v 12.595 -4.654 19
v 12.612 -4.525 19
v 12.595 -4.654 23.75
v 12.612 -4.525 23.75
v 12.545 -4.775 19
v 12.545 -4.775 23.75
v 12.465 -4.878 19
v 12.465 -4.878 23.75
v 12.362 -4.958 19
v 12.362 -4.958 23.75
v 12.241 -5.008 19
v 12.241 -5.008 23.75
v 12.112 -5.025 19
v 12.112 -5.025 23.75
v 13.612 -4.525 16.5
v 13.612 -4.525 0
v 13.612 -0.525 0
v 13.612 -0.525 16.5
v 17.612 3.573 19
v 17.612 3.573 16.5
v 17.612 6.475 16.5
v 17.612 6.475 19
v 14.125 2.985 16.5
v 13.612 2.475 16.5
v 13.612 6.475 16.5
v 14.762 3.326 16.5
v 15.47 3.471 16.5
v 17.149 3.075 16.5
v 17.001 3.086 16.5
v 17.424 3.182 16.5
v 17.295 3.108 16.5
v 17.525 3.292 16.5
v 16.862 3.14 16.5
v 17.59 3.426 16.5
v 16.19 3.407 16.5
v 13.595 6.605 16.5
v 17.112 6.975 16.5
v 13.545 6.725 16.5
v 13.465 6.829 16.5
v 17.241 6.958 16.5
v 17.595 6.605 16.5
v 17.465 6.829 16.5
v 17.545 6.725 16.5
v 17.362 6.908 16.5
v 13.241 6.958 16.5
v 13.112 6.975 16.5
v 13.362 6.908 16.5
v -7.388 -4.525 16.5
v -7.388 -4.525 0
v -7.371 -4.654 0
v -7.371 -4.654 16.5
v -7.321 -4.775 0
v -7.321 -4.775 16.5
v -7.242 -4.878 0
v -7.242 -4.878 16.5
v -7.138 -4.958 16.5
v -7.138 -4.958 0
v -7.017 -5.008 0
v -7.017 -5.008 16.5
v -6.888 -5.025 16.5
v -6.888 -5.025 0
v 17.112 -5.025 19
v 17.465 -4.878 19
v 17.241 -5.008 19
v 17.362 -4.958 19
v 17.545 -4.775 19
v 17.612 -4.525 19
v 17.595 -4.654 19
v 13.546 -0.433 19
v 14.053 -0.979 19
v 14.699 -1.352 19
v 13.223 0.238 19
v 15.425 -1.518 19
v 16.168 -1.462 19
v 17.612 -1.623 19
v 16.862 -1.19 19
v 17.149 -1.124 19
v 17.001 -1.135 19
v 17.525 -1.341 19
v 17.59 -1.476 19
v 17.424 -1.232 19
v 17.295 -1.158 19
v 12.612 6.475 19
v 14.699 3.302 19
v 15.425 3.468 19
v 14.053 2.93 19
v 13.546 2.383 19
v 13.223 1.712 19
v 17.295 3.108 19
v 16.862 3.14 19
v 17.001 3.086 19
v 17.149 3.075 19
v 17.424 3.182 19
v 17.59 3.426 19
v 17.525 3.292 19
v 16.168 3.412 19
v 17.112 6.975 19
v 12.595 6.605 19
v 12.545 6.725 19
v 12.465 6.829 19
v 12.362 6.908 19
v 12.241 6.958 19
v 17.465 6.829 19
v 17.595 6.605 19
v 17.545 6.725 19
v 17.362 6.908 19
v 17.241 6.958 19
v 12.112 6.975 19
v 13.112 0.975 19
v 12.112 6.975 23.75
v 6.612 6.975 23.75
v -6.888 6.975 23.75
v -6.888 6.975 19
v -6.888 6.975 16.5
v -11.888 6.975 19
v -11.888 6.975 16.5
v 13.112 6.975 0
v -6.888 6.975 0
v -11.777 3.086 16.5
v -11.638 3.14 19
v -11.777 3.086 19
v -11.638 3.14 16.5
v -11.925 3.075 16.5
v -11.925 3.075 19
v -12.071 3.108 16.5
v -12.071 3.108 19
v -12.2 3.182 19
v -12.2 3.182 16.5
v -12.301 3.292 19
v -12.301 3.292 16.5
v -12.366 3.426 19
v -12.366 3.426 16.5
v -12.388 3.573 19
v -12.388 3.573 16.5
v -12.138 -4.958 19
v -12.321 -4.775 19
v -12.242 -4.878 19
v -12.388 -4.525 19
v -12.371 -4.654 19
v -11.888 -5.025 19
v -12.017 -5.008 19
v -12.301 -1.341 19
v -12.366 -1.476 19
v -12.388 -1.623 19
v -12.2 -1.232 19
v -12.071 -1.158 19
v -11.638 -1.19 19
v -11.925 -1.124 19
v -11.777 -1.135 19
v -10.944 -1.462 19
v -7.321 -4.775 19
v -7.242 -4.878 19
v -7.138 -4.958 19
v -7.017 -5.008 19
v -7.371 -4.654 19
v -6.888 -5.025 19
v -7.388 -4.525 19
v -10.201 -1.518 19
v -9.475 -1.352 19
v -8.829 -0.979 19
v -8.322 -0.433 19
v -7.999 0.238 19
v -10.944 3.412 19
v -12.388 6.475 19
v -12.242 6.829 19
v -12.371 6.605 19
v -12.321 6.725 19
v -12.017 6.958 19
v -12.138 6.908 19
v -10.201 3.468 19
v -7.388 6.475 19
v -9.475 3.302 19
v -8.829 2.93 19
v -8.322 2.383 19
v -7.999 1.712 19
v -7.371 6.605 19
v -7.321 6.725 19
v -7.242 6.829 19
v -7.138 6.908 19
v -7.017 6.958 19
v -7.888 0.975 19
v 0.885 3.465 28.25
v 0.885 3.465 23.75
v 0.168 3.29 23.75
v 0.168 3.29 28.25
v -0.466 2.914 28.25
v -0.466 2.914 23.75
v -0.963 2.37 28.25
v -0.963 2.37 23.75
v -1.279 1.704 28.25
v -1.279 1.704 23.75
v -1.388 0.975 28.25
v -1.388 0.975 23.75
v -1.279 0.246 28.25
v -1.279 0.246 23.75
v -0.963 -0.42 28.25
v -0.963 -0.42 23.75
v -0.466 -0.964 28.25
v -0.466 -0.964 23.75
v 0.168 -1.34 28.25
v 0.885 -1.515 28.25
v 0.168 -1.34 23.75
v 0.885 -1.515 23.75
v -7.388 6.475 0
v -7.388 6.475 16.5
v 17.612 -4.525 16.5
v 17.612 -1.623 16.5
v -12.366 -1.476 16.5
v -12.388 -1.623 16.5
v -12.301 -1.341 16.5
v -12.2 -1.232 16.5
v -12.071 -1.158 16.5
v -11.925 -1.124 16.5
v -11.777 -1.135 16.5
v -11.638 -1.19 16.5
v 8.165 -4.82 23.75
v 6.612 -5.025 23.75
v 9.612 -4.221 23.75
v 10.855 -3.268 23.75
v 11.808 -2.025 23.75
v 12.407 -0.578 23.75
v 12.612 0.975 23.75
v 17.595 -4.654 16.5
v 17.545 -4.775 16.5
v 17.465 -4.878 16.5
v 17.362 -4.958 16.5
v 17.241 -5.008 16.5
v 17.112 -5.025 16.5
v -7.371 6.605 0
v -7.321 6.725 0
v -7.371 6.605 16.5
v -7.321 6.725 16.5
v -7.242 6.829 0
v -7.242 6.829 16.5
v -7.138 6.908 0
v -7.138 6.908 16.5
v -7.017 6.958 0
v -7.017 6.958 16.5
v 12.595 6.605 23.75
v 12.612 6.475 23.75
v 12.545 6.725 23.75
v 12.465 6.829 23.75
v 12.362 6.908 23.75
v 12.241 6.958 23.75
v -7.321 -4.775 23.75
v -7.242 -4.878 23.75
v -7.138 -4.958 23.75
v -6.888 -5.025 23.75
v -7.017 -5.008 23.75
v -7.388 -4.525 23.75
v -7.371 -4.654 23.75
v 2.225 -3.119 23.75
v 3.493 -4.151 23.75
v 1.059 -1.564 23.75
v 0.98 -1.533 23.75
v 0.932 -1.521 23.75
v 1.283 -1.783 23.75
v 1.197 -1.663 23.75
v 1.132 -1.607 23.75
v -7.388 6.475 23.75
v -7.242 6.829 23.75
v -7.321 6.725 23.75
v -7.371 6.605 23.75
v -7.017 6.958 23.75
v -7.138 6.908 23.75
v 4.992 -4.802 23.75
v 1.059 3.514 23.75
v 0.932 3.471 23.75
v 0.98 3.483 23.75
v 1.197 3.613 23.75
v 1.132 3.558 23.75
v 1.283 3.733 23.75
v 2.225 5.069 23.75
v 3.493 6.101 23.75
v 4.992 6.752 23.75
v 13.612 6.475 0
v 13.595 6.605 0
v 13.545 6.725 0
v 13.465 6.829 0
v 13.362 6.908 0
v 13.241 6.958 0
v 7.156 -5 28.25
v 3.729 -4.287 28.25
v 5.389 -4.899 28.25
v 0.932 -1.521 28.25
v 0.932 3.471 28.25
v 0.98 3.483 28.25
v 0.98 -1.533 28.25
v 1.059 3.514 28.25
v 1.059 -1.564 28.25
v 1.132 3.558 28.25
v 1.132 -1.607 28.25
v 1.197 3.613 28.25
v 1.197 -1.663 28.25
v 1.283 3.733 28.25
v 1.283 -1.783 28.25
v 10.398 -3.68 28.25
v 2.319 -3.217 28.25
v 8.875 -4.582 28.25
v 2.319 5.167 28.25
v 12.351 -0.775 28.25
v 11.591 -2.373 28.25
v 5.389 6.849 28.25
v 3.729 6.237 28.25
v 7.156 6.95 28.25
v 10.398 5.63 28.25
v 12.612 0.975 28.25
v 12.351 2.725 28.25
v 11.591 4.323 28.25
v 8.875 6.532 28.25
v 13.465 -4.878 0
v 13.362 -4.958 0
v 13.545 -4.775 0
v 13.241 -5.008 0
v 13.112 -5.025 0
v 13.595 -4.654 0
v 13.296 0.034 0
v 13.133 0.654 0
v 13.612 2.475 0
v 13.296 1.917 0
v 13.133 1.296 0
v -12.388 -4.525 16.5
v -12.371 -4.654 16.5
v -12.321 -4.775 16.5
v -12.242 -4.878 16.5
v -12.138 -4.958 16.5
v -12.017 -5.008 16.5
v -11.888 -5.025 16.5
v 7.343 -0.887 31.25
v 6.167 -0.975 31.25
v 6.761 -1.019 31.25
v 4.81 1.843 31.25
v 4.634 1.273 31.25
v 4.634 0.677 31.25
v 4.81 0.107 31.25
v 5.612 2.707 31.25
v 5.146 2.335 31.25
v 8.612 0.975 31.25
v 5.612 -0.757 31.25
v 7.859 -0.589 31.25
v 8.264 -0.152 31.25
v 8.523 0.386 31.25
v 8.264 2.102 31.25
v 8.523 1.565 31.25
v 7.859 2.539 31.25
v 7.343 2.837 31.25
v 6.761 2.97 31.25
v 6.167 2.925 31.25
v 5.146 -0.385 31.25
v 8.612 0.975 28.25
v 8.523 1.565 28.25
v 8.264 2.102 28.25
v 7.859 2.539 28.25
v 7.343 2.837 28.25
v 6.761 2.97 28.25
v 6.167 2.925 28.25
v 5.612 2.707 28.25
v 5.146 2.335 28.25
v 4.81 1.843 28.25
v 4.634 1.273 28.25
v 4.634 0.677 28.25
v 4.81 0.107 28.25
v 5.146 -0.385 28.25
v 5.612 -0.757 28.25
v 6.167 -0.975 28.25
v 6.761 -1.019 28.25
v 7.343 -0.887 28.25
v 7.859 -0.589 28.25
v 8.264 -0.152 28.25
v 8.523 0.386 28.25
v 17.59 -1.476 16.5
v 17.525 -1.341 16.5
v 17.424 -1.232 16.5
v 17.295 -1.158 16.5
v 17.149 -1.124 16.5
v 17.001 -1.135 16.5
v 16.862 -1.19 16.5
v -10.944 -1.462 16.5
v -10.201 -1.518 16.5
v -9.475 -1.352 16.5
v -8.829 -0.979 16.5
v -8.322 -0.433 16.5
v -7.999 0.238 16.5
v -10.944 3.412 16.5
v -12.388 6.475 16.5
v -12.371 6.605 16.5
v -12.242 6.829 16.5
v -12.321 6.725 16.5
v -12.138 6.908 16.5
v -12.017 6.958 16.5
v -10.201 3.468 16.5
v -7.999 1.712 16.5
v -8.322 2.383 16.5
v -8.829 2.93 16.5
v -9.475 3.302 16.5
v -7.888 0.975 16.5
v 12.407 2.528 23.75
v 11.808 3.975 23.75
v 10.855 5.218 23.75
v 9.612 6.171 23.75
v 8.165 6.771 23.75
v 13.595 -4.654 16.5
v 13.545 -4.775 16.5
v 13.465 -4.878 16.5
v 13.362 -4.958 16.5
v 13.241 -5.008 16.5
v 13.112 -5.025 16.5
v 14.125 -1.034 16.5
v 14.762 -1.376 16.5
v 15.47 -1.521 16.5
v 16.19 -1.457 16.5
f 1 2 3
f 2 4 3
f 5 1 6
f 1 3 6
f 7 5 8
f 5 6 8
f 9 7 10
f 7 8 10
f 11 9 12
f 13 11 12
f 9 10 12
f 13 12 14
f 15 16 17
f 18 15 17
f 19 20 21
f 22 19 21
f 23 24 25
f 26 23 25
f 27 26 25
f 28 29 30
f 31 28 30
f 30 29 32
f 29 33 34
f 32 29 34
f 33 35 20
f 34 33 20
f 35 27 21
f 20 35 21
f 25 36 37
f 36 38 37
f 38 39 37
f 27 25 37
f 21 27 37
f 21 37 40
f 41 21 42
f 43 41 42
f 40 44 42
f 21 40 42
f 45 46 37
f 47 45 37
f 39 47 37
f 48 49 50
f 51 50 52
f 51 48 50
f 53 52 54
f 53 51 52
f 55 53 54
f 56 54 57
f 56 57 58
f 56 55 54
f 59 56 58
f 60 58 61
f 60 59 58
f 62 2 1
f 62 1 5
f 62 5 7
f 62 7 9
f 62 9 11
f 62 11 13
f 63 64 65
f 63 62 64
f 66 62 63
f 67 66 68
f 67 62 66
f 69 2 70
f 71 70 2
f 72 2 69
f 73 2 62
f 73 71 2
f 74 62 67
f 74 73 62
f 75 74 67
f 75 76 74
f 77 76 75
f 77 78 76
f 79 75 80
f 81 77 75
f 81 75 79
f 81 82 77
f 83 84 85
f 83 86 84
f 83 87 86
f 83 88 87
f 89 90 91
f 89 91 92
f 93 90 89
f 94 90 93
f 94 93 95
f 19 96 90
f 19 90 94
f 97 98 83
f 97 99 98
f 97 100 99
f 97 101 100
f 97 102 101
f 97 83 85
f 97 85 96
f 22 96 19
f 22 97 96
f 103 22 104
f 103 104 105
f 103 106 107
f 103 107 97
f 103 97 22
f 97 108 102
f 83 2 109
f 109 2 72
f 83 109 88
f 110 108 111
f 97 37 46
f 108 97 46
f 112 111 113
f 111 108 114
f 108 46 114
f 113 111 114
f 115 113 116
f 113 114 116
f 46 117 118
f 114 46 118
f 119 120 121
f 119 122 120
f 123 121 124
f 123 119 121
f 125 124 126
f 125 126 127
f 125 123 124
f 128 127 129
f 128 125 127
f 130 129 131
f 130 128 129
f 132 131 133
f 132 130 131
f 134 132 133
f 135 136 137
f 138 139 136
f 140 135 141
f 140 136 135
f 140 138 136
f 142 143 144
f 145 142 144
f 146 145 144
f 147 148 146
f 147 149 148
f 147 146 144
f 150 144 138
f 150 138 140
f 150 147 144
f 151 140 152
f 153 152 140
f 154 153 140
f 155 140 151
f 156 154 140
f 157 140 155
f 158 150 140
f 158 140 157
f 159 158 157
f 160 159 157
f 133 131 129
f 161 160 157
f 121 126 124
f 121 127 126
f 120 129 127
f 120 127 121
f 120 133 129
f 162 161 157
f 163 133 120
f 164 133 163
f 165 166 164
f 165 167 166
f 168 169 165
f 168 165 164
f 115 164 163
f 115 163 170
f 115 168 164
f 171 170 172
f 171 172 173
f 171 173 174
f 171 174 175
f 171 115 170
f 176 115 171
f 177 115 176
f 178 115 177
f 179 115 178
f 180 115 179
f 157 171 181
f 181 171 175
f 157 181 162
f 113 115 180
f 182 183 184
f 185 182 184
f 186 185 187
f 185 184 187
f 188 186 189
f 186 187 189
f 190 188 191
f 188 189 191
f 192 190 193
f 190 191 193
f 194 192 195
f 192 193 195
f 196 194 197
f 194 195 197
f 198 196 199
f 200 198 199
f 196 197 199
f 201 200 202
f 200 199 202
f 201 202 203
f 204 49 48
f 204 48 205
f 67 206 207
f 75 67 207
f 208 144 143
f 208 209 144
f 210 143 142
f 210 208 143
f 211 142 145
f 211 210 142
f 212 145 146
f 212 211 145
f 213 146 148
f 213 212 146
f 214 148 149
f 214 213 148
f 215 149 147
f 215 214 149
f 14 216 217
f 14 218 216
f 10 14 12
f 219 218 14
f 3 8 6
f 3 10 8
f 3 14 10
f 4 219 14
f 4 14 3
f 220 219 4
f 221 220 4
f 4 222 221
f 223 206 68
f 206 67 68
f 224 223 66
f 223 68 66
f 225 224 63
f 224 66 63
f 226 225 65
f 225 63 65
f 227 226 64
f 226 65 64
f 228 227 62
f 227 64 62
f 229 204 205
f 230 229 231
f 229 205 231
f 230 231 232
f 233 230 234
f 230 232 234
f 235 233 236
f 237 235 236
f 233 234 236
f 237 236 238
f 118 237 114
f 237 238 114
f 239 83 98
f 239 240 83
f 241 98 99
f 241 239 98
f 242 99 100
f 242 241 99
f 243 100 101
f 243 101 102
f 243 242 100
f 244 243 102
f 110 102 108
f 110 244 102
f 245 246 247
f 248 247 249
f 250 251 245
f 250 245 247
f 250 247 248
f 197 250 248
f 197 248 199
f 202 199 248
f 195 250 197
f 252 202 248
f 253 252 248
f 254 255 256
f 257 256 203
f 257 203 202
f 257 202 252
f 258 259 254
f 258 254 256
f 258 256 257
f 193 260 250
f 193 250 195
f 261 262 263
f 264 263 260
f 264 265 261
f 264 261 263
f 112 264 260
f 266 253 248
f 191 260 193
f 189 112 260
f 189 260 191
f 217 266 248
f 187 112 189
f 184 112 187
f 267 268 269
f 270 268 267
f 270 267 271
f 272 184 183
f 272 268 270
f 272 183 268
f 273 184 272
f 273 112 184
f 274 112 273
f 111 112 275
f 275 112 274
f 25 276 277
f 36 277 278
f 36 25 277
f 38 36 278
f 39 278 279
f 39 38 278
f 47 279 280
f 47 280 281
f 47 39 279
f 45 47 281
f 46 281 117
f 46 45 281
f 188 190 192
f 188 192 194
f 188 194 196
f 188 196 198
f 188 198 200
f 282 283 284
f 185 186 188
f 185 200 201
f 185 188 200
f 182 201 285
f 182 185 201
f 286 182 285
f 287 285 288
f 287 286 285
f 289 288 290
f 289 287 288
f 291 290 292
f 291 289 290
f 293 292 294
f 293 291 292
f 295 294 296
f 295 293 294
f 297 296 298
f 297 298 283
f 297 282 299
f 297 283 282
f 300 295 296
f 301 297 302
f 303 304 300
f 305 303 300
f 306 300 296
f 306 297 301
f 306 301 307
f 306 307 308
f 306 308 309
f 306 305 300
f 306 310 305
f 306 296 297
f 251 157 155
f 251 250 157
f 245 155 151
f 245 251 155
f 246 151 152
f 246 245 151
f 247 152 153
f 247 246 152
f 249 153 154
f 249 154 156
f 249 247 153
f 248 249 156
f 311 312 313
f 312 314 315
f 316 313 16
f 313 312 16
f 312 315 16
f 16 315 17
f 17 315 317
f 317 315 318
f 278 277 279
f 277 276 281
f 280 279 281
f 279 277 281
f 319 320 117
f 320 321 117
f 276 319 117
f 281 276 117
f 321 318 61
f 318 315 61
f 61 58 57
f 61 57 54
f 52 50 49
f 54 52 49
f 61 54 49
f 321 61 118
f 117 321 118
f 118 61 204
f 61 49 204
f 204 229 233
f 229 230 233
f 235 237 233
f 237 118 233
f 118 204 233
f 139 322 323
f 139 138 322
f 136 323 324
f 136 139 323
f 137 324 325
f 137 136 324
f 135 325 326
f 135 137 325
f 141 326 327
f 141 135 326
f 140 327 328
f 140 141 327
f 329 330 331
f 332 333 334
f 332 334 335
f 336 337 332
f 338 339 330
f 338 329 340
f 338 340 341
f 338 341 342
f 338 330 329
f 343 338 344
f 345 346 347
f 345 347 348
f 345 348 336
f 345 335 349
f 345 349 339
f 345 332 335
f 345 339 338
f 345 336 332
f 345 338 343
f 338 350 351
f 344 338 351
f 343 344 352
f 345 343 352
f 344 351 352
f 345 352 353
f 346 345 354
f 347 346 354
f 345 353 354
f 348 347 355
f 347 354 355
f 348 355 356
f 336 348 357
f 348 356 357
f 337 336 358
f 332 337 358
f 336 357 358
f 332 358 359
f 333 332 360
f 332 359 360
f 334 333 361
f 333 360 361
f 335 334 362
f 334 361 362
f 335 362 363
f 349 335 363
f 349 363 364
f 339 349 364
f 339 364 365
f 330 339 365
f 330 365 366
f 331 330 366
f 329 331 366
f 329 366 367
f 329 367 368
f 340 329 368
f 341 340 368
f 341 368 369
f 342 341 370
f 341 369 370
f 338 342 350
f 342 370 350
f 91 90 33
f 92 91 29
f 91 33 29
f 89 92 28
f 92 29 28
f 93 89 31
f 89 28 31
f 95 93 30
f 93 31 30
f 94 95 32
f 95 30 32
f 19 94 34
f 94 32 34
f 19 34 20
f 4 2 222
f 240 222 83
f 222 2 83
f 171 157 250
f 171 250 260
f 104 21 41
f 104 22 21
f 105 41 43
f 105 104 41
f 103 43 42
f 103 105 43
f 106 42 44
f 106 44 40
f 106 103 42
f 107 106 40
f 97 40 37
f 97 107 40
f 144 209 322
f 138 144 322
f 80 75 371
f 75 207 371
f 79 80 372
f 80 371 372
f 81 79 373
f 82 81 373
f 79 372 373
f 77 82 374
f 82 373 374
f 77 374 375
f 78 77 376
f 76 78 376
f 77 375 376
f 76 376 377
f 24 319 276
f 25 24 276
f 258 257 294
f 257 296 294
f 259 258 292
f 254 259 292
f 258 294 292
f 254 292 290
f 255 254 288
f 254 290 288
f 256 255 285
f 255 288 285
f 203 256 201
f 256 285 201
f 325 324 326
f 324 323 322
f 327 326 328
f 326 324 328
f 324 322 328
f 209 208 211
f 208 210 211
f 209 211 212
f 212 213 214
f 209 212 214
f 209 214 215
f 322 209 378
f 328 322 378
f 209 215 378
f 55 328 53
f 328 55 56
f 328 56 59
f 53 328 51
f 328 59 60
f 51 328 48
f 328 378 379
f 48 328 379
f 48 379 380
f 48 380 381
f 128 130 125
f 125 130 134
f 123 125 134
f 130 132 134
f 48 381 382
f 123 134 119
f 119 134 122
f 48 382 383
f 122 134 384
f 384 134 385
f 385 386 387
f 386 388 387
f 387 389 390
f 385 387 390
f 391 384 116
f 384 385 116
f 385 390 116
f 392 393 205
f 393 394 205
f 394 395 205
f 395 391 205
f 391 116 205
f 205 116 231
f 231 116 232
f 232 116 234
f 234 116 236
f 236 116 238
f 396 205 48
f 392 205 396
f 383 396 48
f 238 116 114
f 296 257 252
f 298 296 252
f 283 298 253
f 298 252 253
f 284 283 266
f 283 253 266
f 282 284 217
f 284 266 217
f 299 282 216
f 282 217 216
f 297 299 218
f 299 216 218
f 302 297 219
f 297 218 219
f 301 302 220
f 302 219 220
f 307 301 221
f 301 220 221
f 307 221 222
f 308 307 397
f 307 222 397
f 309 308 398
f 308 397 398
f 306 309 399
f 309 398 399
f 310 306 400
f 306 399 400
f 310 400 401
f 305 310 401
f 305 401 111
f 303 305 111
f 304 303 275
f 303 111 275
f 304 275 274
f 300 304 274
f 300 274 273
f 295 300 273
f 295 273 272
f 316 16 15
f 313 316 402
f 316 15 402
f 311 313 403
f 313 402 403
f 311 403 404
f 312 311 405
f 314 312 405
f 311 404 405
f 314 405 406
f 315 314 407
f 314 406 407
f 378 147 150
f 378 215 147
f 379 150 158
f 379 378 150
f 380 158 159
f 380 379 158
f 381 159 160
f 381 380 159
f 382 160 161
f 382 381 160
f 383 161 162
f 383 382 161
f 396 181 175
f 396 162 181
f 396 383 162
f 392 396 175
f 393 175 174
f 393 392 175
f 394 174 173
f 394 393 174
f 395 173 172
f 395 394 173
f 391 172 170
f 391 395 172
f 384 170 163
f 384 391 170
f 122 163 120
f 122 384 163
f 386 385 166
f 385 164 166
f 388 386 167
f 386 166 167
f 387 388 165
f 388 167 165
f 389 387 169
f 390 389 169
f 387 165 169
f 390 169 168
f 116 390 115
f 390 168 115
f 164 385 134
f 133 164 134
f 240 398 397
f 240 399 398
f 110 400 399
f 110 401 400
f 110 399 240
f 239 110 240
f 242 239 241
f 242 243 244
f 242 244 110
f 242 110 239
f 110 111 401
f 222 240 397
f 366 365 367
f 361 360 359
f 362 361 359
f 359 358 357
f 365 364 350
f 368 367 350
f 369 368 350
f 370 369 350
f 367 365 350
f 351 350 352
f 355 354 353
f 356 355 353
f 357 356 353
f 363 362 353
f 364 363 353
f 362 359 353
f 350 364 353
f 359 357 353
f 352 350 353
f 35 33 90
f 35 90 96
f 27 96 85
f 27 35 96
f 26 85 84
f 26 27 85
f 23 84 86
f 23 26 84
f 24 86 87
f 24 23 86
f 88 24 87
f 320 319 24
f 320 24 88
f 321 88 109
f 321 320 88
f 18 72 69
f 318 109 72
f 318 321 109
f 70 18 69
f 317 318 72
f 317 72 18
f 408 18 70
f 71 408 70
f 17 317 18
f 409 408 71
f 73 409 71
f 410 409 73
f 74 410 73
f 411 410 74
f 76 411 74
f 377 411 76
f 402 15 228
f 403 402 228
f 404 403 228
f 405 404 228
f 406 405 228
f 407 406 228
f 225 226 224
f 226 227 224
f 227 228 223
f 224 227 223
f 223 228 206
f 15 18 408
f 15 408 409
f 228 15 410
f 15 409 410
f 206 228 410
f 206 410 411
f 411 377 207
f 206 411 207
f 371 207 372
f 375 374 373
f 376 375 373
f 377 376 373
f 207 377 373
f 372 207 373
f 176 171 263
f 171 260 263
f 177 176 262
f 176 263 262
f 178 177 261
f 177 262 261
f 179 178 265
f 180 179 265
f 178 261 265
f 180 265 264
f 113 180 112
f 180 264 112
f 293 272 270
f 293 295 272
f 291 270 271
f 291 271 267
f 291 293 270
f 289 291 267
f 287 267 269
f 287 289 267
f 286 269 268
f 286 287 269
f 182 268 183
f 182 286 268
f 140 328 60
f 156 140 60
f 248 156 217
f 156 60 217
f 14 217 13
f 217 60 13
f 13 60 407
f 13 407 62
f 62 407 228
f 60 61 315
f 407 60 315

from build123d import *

# Parameters (mm, degrees)
SKETCH1_W           = 12
SKETCH1_H           = 21
BOSS_EXTRUDE1_DEPTH = 16.5
BOSS_EXTRUDE2_DEPTH = 2.5
SKETCH3_W           = 20
SKETCH3_H           = 12
BOSS_EXTRUDE3_DEPTH = 4.75
BOSS_EXTRUDE4_DEPTH = 4.5
SKETCH5_R           = 2
BOSS_EXTRUDE5_DEPTH = 3
CUT_EXTRUDE1_START  = -19
SKETCH7_R           = 2.5
CUT_EXTRUDE1_DEPTH  = 19
FILLET1_R           = 0.5


with BuildPart() as part:
    # Sketch1 → Boss-Extrude1 (new body)
    with BuildSketch(Plane(origin=(0, 0, 0), x_dir=(0, 1, 0), z_dir=(0, 0, 1))):
        with Locations((0.975124378, -3.111940299)):
            Rectangle(SKETCH1_W, SKETCH1_H)
    extrude(amount=BOSS_EXTRUDE1_DEPTH)

    # Sketch2 → Boss-Extrude2 (add)
    with BuildSketch(Plane.XY.offset(16.5)):
        Polygon((-7.388059701, 6.975124378), (-12.388059701, 6.975124378), (-12.388059701, -5.024875622), (-7.388059701, -5.024875622), (13.611940299, -5.024875622), (17.611940299, -5.024875622), (17.611940299, 6.975124378), (12.611940299, 6.975124378), align=None)
    extrude(amount=BOSS_EXTRUDE2_DEPTH)

    # Sketch3 → Boss-Extrude3 (add)
    with BuildSketch(Plane.XY.offset(19)):
        with Locations((2.611940299, 0.975124378)):
            Rectangle(SKETCH3_W, SKETCH3_H)
    extrude(amount=BOSS_EXTRUDE3_DEPTH)

    # Sketch4 → Boss-Extrude4 (add)
    with BuildSketch(Plane.XY.offset(23.75)):
        with BuildLine():
            ThreePointArc((1.157394845, -1.524462367), (12.611940299, 0.975124378), (1.157394845, 3.474711123))
            ThreePointArc((1.157394845, 3.474711123), (-1.388059703, 0.975124378), (1.157394845, -1.524462367))
        make_face()
    extrude(amount=BOSS_EXTRUDE4_DEPTH)

    # Sketch7 → Cut-Extrude1 (cut)
    with BuildSketch(Plane.XY.offset(19).offset(CUT_EXTRUDE1_START)):
        with Locations((15.611940299, 0.975124378)):
            Circle(SKETCH7_R)
        with Locations((-10.388059701, 0.975124378)):
            Circle(SKETCH7_R)
    extrude(amount=CUT_EXTRUDE1_DEPTH, mode=Mode.SUBTRACT)

    # Fillet1
    fillet1_edges = [part.edges().sort_by_distance(p)[0] for p in [
        (-12.388059701, 6.975124378, 17.75),
        (-12.388059701, -5.024875622, 17.75),
        (17.611940299, -5.024875622, 17.75),
        (17.611940299, 6.975124378, 17.75),
        (-7.388059701, 6.975124378, 21.375),
        (-7.388059701, -5.024875622, 21.375),
        (12.611940299, -5.024875622, 21.375),
        (12.611940299, 6.975124378, 21.375),
        (1.157394845, 3.474711123, 26),
        (1.157394845, -1.524462367, 26),
        (17.611940299, -0.524875622, 17.75),
        (17.611940299, 2.475124378, 17.75),
        (-12.388059701, 2.475124378, 17.75),
        (-12.388059701, -0.524875622, 17.75),
        (13.611940299, 6.975124378, 8.25),
        (13.611940299, -5.024875622, 8.25),
        (-7.388059701, -5.024875622, 8.25),
        (-7.388059701, 6.975124378, 8.25),
    ]]
    fillet(fillet1_edges, radius=FILLET1_R)


with BuildPart() as body_2:
    # Sketch5 → Boss-Extrude5 (new body)
    with BuildSketch(Plane.XY.offset(28.25)):
        with Locations((6.611940299, 0.975124378)):
            Circle(SKETCH5_R)
    extrude(amount=BOSS_EXTRUDE5_DEPTH)


solid = Compound([part.part, body_2.part])
